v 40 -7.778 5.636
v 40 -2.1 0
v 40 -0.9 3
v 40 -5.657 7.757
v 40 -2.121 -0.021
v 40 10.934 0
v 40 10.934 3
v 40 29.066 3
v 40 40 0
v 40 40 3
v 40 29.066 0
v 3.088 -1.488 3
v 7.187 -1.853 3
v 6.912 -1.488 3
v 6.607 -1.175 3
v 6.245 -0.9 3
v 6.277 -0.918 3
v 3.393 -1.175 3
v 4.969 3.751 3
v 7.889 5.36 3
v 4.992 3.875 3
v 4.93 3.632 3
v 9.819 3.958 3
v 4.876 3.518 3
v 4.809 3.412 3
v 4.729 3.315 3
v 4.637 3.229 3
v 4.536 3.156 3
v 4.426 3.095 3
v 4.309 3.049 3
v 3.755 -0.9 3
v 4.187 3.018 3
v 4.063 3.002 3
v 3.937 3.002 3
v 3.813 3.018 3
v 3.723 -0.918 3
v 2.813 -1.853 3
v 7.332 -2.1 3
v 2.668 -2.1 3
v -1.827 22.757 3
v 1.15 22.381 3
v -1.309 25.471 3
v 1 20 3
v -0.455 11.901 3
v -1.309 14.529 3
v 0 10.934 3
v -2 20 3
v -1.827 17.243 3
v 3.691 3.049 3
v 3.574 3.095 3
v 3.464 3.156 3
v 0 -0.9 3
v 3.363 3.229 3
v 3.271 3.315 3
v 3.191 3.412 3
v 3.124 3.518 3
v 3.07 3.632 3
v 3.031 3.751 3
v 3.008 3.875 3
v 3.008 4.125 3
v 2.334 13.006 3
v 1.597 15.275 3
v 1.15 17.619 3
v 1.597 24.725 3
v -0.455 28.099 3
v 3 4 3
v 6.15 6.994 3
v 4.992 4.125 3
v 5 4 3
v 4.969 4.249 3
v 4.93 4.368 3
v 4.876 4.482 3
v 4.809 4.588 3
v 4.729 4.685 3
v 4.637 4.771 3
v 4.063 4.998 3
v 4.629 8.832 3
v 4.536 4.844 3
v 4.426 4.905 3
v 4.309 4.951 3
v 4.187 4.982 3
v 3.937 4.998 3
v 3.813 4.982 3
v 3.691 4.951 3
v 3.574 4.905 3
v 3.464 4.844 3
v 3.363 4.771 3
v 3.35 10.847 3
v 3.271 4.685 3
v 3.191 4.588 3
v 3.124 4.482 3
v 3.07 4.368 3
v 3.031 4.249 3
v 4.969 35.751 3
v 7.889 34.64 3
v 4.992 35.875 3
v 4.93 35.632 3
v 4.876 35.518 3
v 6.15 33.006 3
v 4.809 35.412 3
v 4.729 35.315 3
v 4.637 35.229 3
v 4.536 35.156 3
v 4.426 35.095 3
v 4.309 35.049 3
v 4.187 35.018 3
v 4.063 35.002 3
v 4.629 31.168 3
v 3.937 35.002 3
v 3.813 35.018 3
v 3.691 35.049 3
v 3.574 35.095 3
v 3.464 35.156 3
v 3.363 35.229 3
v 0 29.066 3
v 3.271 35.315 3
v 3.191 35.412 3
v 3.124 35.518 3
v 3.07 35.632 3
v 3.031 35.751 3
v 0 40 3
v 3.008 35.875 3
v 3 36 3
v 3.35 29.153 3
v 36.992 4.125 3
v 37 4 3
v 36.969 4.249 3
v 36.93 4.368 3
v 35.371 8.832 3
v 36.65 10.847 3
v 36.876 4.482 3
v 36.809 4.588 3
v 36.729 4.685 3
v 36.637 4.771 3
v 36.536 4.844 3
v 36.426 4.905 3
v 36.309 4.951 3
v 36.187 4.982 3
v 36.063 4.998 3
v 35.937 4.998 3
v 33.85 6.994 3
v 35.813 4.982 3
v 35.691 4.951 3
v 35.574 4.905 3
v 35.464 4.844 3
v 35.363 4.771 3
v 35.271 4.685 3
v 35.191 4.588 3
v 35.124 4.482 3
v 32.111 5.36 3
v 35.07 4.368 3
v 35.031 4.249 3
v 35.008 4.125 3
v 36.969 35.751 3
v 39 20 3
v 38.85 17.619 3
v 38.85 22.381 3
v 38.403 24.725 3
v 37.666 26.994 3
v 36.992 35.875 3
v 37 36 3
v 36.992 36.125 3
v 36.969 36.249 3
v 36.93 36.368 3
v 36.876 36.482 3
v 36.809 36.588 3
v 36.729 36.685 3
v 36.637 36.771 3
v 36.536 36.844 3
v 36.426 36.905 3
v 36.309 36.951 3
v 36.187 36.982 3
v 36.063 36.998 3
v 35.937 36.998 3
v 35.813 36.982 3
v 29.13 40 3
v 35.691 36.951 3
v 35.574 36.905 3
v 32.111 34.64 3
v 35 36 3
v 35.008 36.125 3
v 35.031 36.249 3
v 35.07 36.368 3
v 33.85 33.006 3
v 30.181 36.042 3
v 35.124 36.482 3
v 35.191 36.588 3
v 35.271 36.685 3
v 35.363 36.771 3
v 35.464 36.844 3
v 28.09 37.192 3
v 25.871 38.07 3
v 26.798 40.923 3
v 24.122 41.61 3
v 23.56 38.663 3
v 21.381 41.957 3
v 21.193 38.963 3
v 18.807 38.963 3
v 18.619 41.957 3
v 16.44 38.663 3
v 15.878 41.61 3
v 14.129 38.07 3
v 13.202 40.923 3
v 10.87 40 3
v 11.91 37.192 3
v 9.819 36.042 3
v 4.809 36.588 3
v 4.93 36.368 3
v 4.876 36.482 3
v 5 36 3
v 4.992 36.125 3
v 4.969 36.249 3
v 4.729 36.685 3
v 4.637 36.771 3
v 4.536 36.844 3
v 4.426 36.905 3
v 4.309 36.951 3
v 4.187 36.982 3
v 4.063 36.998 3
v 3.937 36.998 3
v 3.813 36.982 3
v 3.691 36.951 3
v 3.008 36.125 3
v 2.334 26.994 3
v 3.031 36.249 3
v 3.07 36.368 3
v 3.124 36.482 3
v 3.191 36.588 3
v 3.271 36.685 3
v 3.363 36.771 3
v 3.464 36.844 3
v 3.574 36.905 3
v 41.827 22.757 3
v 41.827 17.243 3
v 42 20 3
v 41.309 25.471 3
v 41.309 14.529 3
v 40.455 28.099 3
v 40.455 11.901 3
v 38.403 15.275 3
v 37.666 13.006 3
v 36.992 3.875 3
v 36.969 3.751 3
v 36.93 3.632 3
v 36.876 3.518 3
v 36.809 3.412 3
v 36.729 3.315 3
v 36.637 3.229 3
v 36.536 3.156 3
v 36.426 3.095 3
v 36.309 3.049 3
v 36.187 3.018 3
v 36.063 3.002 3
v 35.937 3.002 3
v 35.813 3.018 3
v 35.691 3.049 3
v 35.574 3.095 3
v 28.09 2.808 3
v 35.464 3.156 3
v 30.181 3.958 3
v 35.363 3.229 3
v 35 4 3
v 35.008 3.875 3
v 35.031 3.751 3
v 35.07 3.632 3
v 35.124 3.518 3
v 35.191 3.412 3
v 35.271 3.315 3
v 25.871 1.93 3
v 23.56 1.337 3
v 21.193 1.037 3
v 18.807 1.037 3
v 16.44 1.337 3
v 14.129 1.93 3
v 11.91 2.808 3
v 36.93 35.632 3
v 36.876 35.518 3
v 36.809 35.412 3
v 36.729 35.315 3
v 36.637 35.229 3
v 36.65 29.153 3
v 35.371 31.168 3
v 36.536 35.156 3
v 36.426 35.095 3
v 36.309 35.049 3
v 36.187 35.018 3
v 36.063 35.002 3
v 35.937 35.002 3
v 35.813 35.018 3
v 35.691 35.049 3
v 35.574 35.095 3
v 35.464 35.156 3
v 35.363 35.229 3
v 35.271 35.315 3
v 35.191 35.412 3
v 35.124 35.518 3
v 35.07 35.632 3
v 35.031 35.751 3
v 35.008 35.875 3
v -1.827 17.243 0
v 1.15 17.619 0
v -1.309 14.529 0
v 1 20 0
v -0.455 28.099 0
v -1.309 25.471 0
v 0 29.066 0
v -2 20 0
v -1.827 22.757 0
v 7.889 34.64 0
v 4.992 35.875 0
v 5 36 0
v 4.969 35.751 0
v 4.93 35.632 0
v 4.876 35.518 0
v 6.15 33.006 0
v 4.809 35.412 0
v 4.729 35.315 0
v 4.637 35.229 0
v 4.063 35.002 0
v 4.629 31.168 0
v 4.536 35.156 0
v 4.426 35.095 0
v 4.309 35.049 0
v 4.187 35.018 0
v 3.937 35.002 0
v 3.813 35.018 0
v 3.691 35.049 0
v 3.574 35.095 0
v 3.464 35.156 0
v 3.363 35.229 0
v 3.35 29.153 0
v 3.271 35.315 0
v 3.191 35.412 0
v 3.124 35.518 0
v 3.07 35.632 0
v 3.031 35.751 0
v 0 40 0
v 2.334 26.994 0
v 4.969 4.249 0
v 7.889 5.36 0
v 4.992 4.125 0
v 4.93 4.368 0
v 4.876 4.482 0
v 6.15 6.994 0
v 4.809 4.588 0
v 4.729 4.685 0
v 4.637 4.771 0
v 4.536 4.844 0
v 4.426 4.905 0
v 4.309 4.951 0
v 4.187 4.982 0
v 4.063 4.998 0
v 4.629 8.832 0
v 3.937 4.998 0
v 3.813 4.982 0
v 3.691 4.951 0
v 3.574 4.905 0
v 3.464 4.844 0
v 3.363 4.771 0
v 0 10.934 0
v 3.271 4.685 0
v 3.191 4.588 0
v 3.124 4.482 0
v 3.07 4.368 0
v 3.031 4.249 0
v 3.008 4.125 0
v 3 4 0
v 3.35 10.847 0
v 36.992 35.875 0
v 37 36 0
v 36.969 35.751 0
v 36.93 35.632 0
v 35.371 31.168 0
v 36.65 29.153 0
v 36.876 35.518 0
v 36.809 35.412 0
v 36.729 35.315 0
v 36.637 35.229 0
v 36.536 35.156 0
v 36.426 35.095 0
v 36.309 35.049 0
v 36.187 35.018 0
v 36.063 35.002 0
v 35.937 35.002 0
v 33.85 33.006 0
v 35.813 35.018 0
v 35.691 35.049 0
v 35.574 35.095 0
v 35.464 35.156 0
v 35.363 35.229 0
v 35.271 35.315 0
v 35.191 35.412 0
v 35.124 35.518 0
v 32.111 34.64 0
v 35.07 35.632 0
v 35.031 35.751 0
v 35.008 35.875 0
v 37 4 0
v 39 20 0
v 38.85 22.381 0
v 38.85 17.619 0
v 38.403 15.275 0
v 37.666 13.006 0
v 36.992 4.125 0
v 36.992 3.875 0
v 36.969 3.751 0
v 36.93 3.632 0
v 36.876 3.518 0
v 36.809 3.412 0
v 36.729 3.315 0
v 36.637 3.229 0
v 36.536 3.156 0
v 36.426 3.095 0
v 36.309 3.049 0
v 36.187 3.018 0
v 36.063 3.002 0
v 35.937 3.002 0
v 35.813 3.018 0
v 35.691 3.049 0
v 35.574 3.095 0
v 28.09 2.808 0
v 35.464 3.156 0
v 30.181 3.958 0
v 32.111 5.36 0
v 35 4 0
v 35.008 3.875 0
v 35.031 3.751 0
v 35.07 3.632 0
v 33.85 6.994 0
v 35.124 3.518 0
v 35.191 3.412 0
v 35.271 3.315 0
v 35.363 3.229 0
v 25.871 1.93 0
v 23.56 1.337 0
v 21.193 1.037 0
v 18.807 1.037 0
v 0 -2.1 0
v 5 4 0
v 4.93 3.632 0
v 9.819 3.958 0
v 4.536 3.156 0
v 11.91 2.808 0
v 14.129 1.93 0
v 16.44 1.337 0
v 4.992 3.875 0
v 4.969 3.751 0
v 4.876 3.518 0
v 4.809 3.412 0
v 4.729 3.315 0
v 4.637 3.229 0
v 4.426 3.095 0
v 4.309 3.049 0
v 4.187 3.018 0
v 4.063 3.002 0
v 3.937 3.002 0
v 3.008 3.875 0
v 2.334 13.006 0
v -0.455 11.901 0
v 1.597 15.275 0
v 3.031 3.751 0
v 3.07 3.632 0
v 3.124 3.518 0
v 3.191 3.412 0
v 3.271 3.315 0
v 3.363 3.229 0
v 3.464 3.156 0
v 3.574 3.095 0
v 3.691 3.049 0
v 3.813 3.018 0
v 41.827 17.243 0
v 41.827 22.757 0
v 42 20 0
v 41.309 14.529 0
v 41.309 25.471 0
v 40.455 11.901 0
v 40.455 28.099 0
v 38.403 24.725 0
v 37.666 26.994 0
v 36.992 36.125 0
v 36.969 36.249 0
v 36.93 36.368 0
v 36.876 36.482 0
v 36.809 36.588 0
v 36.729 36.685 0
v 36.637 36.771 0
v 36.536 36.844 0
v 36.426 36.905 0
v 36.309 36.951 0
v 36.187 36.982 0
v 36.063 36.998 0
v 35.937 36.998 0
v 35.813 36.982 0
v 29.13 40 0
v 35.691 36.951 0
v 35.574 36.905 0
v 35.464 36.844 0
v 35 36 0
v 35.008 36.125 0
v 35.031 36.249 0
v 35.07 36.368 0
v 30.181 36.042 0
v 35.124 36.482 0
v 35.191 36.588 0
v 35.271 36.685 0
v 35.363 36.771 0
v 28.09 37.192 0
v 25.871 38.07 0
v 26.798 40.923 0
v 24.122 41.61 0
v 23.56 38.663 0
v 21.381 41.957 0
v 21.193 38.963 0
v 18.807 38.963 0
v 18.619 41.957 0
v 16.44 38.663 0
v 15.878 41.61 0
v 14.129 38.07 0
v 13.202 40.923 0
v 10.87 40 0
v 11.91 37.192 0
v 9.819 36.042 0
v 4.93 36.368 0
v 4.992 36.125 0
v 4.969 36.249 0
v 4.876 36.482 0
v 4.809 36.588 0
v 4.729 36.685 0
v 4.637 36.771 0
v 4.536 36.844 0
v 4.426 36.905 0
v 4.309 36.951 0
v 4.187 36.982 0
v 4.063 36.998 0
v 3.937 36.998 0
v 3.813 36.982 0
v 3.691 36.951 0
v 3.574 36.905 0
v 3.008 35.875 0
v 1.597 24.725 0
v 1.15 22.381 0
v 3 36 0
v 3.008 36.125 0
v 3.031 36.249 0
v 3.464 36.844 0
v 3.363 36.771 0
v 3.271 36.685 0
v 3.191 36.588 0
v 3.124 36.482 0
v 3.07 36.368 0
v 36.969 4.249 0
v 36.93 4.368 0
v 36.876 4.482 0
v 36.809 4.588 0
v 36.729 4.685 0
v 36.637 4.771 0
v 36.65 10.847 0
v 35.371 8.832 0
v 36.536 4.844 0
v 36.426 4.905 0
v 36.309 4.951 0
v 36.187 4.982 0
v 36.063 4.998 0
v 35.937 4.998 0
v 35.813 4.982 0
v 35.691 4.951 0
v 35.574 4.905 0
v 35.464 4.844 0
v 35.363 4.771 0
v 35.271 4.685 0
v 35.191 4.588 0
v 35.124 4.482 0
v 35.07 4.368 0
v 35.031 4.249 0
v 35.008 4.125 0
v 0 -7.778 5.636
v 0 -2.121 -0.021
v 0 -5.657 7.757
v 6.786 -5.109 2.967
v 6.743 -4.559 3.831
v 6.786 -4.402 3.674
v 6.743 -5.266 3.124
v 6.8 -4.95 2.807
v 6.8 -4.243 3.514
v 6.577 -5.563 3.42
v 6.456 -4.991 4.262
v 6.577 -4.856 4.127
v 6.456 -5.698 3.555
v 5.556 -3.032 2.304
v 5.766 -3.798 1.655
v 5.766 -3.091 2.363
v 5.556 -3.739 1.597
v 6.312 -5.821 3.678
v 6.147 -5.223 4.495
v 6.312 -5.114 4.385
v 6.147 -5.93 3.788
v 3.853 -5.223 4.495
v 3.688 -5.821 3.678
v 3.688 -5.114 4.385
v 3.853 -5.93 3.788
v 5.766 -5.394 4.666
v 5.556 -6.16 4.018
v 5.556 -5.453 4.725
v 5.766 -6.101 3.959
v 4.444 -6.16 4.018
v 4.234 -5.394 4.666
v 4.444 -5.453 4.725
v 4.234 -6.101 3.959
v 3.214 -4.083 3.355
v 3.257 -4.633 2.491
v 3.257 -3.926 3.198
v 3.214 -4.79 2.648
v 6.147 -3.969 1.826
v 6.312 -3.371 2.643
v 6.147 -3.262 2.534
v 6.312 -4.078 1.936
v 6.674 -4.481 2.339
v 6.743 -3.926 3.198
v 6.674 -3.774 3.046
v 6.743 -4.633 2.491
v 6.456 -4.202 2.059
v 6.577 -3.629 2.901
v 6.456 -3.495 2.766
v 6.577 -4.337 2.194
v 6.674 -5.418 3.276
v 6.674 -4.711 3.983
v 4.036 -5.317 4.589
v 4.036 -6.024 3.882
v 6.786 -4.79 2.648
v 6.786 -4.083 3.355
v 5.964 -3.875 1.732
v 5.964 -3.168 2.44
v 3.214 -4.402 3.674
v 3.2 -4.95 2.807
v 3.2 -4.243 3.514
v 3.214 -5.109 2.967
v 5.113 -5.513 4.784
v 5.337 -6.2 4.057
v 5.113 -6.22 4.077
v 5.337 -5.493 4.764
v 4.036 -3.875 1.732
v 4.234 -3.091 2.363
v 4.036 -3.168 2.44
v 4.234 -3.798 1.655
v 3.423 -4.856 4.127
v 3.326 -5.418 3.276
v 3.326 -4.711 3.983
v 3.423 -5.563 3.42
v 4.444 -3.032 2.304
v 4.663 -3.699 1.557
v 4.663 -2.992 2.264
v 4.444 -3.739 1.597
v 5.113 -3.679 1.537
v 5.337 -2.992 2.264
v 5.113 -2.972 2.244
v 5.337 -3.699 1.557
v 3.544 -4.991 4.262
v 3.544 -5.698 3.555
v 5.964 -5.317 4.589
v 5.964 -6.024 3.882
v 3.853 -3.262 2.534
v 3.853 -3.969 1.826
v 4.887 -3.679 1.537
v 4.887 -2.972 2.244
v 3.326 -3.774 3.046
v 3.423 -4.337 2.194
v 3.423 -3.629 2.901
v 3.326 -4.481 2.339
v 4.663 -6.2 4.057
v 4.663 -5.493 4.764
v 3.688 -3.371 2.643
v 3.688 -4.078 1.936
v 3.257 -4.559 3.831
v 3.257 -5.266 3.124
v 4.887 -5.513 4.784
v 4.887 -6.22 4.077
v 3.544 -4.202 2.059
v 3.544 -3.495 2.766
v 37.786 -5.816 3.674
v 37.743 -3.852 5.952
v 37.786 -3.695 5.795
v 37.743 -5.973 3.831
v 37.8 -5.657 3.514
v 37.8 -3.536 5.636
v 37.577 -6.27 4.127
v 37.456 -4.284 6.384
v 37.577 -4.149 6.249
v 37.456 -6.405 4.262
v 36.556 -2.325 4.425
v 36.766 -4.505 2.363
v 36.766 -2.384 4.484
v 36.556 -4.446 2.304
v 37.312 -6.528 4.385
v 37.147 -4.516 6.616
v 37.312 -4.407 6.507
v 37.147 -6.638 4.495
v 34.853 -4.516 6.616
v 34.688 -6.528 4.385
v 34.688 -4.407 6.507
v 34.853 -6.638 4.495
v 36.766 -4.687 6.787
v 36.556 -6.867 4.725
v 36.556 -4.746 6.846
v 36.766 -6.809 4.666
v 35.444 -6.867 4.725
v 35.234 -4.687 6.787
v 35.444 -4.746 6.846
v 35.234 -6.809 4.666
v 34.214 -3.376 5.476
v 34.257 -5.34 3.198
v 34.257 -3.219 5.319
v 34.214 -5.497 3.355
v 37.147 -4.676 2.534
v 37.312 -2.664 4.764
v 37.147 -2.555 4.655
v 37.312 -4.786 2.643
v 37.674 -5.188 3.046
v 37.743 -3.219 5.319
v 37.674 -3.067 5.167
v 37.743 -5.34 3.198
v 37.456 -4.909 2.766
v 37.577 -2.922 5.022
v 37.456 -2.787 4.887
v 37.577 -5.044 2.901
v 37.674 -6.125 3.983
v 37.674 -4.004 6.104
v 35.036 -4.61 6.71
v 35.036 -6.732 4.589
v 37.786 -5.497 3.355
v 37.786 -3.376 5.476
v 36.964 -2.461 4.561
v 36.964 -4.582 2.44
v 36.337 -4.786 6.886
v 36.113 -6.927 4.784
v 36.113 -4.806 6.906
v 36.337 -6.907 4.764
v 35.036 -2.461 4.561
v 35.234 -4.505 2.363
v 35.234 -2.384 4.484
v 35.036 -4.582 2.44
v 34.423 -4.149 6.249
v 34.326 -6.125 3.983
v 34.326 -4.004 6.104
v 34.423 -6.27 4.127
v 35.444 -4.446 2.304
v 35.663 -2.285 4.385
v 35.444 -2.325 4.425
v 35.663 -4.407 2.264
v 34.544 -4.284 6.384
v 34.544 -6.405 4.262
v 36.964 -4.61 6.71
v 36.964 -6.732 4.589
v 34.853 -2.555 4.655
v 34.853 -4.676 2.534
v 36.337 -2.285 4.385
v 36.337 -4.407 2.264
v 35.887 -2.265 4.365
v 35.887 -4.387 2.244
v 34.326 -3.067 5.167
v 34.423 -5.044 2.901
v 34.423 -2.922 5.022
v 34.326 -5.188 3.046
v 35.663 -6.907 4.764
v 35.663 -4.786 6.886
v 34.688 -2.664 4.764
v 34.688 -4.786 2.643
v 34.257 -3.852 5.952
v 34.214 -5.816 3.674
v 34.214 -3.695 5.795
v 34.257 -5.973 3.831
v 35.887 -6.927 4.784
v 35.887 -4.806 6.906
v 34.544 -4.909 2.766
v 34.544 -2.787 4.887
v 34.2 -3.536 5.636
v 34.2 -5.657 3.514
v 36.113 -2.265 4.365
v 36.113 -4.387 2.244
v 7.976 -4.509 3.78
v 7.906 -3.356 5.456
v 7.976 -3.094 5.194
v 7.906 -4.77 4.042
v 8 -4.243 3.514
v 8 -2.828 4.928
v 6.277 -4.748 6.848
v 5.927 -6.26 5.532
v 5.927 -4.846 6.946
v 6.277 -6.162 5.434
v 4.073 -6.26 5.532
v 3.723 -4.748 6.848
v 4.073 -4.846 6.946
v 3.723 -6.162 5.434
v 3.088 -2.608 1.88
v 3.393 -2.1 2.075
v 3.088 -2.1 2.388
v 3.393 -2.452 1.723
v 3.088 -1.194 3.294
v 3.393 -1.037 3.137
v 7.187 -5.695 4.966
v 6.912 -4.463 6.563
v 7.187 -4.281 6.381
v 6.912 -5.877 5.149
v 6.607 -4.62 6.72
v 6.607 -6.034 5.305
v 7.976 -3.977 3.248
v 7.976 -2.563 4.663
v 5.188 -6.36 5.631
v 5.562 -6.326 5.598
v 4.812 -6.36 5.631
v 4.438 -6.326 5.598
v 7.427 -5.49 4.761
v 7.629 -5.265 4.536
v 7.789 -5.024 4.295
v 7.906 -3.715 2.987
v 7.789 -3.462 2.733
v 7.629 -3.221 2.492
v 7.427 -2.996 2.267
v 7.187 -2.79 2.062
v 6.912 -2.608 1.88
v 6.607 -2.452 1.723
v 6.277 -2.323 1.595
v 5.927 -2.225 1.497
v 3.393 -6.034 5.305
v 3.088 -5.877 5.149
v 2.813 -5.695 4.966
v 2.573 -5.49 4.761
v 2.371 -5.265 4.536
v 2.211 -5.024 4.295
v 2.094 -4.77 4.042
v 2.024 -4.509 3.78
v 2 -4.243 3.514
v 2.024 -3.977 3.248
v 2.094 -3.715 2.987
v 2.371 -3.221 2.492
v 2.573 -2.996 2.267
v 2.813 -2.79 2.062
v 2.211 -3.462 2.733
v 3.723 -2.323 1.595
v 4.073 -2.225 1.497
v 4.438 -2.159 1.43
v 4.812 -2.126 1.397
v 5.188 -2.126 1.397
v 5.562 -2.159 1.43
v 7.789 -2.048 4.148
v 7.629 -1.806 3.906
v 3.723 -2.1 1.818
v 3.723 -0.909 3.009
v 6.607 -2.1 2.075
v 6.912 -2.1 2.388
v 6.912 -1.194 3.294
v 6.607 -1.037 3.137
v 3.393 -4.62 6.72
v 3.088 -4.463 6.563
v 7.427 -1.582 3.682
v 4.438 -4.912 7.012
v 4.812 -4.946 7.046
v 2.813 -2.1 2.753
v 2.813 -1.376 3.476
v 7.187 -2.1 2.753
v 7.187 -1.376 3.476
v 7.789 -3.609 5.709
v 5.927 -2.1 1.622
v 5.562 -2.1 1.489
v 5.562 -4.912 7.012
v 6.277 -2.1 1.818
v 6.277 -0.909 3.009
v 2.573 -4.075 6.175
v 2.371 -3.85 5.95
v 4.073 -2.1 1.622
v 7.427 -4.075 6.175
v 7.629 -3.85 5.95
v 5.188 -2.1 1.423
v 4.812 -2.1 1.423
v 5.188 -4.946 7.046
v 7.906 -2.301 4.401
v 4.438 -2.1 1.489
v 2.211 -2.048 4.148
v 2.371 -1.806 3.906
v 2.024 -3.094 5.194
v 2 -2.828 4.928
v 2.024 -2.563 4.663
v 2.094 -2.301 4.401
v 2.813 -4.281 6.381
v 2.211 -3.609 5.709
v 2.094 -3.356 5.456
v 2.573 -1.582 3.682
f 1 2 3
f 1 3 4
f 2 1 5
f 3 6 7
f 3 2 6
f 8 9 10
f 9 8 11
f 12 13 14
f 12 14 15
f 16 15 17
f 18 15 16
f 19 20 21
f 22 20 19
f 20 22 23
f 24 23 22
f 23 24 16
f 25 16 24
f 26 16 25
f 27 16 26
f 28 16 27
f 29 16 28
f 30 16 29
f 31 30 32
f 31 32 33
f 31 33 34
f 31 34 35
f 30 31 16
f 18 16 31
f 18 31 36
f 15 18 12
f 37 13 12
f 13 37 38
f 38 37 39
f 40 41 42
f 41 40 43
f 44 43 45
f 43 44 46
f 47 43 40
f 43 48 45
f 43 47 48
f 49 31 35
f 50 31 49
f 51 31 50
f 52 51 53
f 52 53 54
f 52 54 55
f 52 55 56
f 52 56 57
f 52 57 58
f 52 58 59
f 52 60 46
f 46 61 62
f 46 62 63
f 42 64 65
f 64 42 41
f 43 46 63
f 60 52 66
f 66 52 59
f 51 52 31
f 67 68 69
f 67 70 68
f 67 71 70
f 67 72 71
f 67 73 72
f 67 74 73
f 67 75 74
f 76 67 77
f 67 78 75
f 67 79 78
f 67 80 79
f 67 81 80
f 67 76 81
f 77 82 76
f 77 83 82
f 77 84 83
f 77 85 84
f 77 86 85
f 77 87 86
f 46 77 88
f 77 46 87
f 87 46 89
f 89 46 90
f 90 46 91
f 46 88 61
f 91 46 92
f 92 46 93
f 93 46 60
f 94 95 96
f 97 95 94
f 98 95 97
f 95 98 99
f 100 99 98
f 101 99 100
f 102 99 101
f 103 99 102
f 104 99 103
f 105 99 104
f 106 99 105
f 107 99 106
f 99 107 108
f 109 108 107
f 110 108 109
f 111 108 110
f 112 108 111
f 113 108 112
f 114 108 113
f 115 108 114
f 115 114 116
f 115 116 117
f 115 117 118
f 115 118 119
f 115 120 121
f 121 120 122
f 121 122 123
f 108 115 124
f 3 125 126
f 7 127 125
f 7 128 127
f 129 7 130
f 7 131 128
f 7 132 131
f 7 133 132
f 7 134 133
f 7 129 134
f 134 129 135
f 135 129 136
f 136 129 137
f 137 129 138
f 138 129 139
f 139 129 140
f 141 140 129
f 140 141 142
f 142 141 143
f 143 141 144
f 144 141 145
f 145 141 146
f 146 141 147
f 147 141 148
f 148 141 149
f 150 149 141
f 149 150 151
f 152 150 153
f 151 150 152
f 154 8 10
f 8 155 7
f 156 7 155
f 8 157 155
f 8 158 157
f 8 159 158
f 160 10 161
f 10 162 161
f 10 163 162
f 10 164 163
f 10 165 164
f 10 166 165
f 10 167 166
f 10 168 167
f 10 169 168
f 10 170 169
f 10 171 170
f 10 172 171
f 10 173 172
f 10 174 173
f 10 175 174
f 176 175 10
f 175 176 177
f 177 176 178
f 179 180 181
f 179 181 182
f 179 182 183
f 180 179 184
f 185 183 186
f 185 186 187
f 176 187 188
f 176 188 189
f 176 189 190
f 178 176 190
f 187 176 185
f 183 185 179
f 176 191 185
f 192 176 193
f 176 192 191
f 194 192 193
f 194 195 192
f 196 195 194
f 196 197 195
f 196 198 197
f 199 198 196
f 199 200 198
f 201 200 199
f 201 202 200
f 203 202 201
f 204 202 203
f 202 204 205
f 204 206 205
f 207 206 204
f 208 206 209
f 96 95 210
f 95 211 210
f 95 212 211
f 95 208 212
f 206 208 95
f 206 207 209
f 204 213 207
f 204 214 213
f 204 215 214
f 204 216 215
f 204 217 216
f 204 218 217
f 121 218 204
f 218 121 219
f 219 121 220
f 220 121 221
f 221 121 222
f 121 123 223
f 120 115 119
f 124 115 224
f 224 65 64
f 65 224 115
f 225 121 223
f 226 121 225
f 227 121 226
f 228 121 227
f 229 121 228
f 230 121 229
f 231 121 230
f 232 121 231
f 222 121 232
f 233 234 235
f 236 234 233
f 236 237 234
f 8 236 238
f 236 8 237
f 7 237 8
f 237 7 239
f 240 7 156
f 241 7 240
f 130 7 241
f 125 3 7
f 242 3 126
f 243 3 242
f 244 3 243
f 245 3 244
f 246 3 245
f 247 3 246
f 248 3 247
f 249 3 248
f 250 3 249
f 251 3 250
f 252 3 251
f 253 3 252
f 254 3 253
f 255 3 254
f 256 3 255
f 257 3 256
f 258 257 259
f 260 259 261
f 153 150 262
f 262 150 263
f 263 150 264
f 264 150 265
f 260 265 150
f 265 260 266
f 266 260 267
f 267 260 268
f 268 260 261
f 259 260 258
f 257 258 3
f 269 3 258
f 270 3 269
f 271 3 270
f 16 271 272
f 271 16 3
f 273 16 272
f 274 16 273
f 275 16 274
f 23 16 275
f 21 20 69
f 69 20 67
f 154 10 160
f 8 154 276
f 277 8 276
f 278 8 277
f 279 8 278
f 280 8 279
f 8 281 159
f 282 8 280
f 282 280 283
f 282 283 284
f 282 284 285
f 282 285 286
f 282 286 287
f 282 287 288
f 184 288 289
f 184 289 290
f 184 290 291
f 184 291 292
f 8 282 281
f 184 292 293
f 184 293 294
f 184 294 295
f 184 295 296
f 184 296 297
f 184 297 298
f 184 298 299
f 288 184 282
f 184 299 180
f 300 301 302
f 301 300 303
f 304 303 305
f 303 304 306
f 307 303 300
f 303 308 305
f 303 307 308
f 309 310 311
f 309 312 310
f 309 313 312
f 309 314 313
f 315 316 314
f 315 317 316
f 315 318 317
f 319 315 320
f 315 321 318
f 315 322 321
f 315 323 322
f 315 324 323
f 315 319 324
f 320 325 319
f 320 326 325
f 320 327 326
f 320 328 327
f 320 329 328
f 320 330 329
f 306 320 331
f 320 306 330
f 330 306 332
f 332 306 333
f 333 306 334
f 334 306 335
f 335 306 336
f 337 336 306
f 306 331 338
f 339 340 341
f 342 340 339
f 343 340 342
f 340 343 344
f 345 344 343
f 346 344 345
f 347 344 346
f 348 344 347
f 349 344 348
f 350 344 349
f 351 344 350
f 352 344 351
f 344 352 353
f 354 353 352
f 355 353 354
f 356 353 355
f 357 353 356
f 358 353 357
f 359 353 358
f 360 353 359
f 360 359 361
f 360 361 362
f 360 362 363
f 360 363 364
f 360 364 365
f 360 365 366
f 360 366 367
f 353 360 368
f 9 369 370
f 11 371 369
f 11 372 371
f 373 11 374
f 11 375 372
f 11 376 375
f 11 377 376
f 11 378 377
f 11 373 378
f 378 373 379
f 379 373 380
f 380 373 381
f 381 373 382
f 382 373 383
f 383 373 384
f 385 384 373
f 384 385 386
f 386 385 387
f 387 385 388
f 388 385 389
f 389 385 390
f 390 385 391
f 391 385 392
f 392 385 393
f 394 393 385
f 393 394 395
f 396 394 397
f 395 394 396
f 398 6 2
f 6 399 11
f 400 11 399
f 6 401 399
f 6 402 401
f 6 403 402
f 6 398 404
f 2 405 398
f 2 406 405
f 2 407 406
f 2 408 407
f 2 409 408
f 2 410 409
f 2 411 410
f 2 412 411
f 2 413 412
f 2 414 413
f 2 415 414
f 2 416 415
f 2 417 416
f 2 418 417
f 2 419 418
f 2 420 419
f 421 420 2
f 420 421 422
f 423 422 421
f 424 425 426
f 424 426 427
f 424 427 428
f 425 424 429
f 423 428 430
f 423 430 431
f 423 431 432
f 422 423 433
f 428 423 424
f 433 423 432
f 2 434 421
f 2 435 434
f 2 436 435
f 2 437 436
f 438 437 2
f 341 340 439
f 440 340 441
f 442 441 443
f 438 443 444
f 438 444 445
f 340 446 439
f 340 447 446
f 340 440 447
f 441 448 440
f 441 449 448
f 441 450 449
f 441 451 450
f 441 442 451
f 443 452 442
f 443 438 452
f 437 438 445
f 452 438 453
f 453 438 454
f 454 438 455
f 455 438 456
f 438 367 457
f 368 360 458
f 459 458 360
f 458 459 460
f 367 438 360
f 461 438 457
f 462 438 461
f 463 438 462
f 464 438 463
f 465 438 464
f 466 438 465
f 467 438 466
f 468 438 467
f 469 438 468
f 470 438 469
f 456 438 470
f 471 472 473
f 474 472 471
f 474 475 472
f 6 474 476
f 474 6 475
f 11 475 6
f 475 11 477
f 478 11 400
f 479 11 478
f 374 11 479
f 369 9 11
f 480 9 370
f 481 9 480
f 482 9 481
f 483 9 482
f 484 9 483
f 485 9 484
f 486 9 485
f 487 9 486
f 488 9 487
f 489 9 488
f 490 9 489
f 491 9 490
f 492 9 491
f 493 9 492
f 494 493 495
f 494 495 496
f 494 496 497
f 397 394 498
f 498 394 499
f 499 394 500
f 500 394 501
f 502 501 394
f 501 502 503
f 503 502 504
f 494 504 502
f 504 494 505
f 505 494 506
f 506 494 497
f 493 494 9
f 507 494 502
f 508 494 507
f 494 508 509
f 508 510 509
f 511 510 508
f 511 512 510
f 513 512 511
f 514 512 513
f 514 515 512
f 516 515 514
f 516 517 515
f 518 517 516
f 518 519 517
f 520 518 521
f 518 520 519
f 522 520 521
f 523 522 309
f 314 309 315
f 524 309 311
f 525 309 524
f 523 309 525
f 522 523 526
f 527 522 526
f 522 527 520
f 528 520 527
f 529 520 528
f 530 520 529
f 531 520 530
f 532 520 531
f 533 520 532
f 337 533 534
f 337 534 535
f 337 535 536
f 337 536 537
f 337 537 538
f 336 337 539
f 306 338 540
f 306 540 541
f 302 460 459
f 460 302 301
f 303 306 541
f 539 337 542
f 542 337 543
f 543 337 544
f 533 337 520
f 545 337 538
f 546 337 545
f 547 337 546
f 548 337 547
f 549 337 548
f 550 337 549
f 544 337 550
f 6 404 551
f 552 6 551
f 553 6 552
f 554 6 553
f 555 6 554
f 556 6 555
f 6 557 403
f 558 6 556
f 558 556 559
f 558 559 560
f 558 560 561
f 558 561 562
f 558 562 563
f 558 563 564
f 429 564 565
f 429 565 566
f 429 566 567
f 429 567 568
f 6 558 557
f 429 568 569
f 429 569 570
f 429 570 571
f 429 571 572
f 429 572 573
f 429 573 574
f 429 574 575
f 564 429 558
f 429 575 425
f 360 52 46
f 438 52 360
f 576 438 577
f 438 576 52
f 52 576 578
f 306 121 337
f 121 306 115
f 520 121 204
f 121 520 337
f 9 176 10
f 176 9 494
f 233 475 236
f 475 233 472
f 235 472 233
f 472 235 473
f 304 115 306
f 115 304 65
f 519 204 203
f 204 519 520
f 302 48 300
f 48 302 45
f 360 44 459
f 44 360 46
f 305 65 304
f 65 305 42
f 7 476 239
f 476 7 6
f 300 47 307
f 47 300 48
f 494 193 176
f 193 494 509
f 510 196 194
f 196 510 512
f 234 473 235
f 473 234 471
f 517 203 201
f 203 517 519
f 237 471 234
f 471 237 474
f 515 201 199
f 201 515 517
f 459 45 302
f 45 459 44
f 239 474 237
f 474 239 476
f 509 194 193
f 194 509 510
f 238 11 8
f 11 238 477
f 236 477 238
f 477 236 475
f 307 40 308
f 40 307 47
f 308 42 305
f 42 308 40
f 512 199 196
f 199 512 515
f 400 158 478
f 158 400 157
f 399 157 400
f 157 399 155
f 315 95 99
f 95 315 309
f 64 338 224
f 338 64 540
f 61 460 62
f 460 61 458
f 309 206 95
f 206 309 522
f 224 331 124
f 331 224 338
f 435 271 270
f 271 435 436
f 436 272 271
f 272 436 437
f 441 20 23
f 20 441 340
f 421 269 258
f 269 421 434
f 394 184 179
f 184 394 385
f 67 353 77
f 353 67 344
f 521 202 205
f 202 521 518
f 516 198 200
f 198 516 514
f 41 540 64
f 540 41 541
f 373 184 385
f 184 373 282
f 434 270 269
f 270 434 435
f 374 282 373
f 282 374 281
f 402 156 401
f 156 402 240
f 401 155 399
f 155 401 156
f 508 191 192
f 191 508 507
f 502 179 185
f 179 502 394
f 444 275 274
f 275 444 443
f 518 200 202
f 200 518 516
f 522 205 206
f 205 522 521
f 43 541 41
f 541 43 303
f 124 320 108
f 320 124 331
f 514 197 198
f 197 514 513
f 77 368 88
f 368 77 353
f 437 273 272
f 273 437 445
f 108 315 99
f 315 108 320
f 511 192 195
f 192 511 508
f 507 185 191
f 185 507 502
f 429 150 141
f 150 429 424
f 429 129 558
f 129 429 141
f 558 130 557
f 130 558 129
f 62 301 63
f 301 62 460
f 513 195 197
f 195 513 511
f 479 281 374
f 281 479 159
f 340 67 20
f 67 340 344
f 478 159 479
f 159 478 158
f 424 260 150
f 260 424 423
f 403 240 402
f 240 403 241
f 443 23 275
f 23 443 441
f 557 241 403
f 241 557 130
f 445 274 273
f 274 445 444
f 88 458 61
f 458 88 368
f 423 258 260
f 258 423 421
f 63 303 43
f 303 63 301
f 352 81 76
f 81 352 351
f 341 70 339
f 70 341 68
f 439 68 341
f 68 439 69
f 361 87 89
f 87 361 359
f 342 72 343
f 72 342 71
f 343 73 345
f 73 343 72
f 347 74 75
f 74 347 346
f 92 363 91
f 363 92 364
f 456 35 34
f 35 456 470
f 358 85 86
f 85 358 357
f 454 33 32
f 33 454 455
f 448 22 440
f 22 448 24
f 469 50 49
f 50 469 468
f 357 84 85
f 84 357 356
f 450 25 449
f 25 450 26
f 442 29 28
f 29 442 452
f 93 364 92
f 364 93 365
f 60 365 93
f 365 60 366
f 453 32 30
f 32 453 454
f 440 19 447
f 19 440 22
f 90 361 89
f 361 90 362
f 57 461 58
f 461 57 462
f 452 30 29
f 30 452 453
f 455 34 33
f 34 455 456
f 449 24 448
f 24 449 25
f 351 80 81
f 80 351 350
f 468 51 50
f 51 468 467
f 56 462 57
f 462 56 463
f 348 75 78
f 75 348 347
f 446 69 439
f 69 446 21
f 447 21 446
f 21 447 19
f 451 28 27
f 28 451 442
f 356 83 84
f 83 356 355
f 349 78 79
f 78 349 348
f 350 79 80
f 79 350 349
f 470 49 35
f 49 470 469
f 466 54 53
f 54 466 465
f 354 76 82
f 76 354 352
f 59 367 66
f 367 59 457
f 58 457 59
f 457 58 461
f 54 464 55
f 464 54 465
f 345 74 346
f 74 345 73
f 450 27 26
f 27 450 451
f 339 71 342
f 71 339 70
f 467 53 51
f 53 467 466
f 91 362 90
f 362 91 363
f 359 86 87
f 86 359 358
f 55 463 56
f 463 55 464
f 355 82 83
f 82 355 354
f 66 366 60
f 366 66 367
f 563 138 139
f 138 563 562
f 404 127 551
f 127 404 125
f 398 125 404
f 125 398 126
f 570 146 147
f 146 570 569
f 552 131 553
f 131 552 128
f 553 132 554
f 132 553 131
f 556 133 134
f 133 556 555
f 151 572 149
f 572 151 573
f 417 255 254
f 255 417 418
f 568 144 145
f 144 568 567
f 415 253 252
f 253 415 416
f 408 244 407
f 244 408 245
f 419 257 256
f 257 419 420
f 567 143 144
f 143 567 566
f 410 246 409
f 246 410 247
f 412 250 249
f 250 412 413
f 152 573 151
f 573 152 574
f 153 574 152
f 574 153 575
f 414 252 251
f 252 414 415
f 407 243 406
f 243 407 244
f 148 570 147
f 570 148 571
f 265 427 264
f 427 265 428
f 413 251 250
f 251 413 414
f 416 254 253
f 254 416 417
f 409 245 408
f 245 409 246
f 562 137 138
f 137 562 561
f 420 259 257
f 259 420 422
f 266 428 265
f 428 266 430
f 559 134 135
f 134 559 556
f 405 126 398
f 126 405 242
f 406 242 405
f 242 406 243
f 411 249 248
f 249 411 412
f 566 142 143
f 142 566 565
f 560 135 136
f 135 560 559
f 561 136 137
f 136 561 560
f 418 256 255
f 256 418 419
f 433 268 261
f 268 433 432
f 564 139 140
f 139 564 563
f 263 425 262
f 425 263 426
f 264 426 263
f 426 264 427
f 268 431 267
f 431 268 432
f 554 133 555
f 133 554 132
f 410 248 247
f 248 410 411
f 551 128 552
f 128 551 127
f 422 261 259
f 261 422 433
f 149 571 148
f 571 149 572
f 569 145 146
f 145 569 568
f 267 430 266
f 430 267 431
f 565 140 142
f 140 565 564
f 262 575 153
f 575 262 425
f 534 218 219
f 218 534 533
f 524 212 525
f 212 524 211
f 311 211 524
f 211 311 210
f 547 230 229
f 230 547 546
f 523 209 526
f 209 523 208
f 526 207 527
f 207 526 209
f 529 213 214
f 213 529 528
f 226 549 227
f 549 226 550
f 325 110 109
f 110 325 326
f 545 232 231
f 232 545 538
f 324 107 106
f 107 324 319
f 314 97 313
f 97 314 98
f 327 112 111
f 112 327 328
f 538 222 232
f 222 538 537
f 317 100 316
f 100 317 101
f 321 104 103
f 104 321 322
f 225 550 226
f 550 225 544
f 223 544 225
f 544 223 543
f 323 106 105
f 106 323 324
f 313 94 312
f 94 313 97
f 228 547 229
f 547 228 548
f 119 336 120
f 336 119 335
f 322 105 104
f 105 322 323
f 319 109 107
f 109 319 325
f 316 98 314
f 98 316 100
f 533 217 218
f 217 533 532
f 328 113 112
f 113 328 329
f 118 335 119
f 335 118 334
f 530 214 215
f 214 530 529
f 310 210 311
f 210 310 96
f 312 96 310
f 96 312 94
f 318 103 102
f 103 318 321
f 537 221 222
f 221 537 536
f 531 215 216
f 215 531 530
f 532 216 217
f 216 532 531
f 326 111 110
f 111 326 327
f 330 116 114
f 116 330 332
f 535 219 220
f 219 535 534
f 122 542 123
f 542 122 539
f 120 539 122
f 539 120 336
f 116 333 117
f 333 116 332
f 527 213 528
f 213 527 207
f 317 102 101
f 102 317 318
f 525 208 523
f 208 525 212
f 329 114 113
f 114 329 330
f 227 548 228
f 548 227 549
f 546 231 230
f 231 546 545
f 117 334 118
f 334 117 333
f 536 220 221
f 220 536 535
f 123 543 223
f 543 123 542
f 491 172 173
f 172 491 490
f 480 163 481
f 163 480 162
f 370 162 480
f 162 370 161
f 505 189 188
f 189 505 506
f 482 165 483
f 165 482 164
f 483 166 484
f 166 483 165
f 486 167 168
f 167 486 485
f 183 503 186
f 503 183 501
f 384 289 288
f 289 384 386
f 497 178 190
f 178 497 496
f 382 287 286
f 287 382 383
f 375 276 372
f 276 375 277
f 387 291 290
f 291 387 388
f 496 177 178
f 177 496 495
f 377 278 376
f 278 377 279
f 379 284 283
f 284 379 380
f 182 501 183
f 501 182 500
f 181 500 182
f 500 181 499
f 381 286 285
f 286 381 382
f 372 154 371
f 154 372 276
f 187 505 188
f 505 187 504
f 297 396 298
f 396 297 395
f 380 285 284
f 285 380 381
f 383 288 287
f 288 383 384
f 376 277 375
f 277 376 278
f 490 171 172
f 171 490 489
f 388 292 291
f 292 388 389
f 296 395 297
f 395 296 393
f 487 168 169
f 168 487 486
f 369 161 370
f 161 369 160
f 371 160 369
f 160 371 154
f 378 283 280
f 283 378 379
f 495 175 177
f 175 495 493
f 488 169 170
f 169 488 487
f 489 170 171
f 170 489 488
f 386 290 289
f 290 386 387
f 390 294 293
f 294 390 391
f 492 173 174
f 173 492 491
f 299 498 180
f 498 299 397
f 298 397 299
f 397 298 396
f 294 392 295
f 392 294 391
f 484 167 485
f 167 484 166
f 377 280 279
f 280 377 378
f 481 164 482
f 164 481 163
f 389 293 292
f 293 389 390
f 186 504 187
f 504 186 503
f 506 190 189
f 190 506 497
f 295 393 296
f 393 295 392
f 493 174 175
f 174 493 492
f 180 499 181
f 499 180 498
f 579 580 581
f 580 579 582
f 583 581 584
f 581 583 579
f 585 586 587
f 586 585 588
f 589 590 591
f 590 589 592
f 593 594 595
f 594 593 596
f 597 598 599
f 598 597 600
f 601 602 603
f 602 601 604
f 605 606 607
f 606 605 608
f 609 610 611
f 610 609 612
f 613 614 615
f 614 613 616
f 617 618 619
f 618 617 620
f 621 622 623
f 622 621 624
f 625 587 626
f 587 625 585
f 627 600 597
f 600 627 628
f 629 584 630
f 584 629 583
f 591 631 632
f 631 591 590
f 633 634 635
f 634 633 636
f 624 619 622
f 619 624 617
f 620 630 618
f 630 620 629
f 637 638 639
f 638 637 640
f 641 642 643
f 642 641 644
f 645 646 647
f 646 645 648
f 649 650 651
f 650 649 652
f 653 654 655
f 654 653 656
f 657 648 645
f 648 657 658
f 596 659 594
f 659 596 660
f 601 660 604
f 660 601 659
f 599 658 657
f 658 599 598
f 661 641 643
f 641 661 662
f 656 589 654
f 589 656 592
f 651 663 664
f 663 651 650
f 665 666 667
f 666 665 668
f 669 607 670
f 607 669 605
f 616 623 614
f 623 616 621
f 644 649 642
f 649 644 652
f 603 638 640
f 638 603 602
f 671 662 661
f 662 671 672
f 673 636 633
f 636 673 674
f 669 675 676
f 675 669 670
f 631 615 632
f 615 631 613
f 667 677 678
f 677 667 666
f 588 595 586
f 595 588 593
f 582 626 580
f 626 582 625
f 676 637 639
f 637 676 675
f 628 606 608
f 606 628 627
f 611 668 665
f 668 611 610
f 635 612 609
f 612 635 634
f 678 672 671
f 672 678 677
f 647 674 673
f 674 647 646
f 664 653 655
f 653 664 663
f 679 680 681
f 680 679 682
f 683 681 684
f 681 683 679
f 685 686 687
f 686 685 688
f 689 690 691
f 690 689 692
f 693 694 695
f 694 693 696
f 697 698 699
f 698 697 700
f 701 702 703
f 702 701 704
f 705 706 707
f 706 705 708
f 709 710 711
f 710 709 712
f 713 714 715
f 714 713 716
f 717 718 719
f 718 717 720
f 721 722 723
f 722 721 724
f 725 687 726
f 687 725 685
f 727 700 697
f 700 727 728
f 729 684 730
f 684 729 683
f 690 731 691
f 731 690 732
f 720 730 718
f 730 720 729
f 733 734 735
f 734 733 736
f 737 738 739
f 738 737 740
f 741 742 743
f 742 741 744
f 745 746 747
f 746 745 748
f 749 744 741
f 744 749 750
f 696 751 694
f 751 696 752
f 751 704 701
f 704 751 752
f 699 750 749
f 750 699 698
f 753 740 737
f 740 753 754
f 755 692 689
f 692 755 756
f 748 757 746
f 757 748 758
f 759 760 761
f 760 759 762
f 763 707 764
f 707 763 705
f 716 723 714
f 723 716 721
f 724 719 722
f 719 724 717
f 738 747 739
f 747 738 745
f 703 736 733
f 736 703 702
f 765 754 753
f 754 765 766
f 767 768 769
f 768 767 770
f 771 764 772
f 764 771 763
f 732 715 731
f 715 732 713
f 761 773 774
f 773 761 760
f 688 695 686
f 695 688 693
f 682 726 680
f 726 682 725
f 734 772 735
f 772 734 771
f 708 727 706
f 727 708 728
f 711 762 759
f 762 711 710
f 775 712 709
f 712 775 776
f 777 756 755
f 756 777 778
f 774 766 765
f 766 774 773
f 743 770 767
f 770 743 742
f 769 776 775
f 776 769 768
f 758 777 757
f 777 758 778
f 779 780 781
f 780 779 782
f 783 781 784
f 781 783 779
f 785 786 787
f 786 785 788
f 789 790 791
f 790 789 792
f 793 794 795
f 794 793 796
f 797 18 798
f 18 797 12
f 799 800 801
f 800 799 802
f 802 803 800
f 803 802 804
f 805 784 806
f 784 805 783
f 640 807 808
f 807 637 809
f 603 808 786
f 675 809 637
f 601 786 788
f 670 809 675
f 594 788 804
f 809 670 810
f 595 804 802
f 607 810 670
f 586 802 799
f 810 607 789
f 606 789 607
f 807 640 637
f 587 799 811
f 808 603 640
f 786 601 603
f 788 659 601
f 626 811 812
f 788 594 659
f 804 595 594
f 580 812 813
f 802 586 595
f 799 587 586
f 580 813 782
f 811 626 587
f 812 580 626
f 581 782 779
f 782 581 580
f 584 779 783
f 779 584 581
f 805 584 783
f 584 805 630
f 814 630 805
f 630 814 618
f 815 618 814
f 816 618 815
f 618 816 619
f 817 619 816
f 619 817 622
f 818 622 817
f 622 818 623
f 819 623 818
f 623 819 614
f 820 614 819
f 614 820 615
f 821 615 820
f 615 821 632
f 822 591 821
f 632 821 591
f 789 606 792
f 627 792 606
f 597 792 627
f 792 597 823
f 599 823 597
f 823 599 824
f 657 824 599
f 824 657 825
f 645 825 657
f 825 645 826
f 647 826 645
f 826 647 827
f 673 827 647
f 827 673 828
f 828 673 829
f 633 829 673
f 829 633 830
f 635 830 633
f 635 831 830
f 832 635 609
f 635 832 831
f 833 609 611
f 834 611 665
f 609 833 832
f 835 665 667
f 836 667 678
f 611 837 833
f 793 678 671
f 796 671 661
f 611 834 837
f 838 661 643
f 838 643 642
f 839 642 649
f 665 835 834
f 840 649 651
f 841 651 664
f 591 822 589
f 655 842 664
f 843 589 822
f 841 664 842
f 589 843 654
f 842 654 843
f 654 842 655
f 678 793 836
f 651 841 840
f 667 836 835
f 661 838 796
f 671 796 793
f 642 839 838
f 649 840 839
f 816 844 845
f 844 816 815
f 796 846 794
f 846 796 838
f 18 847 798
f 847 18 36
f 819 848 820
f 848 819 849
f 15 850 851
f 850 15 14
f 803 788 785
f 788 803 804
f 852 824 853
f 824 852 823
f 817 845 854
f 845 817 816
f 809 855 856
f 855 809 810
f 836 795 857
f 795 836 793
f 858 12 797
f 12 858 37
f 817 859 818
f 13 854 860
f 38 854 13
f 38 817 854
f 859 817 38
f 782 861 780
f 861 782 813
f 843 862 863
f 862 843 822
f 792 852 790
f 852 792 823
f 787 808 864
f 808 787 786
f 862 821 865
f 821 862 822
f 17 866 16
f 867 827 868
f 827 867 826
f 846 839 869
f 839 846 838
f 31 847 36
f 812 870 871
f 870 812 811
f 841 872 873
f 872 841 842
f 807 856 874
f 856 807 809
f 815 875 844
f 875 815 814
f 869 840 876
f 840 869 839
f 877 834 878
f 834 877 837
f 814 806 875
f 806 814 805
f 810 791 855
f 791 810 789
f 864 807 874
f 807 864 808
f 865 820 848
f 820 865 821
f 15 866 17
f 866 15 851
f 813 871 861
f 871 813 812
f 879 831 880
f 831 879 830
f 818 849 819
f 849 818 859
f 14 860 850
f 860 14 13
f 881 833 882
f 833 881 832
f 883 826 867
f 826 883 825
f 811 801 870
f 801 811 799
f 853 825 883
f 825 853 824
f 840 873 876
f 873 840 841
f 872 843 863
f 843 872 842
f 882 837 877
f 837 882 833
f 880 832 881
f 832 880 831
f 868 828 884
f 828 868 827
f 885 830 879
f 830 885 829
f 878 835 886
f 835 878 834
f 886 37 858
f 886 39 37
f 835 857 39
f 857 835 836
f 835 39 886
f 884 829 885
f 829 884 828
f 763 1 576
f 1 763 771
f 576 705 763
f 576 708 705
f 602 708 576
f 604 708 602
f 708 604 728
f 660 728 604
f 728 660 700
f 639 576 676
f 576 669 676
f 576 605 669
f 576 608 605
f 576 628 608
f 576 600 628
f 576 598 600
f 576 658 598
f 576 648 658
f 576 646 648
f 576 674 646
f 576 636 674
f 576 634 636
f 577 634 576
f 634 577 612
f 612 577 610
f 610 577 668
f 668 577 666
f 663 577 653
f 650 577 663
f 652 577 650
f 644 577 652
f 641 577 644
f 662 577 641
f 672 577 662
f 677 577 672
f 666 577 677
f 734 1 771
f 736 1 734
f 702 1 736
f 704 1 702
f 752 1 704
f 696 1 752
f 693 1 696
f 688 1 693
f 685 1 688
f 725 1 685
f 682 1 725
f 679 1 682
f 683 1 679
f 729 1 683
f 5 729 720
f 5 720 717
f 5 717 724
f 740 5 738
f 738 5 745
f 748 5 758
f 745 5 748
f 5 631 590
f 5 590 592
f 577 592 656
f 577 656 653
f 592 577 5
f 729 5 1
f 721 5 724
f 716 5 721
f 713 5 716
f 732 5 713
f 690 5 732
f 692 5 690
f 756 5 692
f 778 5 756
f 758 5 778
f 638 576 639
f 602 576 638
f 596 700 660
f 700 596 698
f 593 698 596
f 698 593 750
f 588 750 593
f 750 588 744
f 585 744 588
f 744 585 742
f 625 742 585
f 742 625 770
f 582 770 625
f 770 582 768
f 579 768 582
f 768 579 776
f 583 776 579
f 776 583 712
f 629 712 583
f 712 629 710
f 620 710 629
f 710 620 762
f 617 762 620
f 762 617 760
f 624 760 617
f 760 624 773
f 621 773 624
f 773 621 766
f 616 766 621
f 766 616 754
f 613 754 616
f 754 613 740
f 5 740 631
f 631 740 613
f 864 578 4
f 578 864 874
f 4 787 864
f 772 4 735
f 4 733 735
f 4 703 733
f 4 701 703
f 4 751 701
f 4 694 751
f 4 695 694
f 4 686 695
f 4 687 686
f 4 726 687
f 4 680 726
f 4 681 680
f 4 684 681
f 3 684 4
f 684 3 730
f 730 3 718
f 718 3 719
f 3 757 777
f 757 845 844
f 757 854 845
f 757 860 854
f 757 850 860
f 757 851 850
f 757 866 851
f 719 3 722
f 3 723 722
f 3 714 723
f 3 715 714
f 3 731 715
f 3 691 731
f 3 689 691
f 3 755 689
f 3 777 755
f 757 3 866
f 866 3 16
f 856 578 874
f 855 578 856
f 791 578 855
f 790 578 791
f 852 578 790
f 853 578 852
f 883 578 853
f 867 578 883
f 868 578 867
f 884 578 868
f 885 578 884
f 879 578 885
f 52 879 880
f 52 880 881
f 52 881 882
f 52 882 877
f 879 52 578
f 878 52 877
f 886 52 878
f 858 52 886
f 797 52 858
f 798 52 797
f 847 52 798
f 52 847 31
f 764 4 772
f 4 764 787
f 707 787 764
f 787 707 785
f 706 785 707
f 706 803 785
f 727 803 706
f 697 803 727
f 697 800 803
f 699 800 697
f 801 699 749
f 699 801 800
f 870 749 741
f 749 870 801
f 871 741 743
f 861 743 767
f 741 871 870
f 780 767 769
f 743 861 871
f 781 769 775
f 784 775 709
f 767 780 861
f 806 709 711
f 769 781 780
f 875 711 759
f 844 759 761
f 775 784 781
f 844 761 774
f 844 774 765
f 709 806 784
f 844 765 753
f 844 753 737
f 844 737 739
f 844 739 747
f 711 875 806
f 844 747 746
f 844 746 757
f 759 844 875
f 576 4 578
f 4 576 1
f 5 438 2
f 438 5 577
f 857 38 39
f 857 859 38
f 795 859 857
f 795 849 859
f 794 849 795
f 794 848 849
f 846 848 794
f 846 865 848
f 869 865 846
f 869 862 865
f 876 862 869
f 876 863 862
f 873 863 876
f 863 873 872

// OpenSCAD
$fn=50;

translate([0,-2.1,0])
cube([40,3,3]);
sak();
translate([0,0,2.1])
rotate([45+90,0,0])
difference()
{

union()
{
cube([40,8,3]);

}

union()
{
translate([5,4,-1])
cylinder(r=1.8, h=10);

translate([31+5,5,-1])
cylinder(r=1.8, h=10);

translate([5,4,-1])
cylinder(r=3, h=3);

}
}


/*
hull()
{
translate([5,5,0])
cylinder(r=5,h=3);
translate([31+5,5,0])
cylinder(r=5,h=3);
}
*/


//translate([0,0,0])
//rotate([90,0,0])

module sak()
{
union()
{
difference()
{
  union()
  {
    cube([40,40,3]);
    translate([20,20,0])
    cylinder(r=22,h=3);
  }

  union()
  {
    translate([20,20,-.1])
    cylinder(r=19,h=4.1);

    translate([4,4,-.1])
    cylinder(r=1,h=5);

    translate([32+4,4,-.1])
    cylinder(r=1,h=5);

    translate([4,32+4,-.1])
    cylinder(r=1,h=5);

    translate([32+4,32+4,-.1])
    cylinder(r=1,h=5);
  }
}
}
}
